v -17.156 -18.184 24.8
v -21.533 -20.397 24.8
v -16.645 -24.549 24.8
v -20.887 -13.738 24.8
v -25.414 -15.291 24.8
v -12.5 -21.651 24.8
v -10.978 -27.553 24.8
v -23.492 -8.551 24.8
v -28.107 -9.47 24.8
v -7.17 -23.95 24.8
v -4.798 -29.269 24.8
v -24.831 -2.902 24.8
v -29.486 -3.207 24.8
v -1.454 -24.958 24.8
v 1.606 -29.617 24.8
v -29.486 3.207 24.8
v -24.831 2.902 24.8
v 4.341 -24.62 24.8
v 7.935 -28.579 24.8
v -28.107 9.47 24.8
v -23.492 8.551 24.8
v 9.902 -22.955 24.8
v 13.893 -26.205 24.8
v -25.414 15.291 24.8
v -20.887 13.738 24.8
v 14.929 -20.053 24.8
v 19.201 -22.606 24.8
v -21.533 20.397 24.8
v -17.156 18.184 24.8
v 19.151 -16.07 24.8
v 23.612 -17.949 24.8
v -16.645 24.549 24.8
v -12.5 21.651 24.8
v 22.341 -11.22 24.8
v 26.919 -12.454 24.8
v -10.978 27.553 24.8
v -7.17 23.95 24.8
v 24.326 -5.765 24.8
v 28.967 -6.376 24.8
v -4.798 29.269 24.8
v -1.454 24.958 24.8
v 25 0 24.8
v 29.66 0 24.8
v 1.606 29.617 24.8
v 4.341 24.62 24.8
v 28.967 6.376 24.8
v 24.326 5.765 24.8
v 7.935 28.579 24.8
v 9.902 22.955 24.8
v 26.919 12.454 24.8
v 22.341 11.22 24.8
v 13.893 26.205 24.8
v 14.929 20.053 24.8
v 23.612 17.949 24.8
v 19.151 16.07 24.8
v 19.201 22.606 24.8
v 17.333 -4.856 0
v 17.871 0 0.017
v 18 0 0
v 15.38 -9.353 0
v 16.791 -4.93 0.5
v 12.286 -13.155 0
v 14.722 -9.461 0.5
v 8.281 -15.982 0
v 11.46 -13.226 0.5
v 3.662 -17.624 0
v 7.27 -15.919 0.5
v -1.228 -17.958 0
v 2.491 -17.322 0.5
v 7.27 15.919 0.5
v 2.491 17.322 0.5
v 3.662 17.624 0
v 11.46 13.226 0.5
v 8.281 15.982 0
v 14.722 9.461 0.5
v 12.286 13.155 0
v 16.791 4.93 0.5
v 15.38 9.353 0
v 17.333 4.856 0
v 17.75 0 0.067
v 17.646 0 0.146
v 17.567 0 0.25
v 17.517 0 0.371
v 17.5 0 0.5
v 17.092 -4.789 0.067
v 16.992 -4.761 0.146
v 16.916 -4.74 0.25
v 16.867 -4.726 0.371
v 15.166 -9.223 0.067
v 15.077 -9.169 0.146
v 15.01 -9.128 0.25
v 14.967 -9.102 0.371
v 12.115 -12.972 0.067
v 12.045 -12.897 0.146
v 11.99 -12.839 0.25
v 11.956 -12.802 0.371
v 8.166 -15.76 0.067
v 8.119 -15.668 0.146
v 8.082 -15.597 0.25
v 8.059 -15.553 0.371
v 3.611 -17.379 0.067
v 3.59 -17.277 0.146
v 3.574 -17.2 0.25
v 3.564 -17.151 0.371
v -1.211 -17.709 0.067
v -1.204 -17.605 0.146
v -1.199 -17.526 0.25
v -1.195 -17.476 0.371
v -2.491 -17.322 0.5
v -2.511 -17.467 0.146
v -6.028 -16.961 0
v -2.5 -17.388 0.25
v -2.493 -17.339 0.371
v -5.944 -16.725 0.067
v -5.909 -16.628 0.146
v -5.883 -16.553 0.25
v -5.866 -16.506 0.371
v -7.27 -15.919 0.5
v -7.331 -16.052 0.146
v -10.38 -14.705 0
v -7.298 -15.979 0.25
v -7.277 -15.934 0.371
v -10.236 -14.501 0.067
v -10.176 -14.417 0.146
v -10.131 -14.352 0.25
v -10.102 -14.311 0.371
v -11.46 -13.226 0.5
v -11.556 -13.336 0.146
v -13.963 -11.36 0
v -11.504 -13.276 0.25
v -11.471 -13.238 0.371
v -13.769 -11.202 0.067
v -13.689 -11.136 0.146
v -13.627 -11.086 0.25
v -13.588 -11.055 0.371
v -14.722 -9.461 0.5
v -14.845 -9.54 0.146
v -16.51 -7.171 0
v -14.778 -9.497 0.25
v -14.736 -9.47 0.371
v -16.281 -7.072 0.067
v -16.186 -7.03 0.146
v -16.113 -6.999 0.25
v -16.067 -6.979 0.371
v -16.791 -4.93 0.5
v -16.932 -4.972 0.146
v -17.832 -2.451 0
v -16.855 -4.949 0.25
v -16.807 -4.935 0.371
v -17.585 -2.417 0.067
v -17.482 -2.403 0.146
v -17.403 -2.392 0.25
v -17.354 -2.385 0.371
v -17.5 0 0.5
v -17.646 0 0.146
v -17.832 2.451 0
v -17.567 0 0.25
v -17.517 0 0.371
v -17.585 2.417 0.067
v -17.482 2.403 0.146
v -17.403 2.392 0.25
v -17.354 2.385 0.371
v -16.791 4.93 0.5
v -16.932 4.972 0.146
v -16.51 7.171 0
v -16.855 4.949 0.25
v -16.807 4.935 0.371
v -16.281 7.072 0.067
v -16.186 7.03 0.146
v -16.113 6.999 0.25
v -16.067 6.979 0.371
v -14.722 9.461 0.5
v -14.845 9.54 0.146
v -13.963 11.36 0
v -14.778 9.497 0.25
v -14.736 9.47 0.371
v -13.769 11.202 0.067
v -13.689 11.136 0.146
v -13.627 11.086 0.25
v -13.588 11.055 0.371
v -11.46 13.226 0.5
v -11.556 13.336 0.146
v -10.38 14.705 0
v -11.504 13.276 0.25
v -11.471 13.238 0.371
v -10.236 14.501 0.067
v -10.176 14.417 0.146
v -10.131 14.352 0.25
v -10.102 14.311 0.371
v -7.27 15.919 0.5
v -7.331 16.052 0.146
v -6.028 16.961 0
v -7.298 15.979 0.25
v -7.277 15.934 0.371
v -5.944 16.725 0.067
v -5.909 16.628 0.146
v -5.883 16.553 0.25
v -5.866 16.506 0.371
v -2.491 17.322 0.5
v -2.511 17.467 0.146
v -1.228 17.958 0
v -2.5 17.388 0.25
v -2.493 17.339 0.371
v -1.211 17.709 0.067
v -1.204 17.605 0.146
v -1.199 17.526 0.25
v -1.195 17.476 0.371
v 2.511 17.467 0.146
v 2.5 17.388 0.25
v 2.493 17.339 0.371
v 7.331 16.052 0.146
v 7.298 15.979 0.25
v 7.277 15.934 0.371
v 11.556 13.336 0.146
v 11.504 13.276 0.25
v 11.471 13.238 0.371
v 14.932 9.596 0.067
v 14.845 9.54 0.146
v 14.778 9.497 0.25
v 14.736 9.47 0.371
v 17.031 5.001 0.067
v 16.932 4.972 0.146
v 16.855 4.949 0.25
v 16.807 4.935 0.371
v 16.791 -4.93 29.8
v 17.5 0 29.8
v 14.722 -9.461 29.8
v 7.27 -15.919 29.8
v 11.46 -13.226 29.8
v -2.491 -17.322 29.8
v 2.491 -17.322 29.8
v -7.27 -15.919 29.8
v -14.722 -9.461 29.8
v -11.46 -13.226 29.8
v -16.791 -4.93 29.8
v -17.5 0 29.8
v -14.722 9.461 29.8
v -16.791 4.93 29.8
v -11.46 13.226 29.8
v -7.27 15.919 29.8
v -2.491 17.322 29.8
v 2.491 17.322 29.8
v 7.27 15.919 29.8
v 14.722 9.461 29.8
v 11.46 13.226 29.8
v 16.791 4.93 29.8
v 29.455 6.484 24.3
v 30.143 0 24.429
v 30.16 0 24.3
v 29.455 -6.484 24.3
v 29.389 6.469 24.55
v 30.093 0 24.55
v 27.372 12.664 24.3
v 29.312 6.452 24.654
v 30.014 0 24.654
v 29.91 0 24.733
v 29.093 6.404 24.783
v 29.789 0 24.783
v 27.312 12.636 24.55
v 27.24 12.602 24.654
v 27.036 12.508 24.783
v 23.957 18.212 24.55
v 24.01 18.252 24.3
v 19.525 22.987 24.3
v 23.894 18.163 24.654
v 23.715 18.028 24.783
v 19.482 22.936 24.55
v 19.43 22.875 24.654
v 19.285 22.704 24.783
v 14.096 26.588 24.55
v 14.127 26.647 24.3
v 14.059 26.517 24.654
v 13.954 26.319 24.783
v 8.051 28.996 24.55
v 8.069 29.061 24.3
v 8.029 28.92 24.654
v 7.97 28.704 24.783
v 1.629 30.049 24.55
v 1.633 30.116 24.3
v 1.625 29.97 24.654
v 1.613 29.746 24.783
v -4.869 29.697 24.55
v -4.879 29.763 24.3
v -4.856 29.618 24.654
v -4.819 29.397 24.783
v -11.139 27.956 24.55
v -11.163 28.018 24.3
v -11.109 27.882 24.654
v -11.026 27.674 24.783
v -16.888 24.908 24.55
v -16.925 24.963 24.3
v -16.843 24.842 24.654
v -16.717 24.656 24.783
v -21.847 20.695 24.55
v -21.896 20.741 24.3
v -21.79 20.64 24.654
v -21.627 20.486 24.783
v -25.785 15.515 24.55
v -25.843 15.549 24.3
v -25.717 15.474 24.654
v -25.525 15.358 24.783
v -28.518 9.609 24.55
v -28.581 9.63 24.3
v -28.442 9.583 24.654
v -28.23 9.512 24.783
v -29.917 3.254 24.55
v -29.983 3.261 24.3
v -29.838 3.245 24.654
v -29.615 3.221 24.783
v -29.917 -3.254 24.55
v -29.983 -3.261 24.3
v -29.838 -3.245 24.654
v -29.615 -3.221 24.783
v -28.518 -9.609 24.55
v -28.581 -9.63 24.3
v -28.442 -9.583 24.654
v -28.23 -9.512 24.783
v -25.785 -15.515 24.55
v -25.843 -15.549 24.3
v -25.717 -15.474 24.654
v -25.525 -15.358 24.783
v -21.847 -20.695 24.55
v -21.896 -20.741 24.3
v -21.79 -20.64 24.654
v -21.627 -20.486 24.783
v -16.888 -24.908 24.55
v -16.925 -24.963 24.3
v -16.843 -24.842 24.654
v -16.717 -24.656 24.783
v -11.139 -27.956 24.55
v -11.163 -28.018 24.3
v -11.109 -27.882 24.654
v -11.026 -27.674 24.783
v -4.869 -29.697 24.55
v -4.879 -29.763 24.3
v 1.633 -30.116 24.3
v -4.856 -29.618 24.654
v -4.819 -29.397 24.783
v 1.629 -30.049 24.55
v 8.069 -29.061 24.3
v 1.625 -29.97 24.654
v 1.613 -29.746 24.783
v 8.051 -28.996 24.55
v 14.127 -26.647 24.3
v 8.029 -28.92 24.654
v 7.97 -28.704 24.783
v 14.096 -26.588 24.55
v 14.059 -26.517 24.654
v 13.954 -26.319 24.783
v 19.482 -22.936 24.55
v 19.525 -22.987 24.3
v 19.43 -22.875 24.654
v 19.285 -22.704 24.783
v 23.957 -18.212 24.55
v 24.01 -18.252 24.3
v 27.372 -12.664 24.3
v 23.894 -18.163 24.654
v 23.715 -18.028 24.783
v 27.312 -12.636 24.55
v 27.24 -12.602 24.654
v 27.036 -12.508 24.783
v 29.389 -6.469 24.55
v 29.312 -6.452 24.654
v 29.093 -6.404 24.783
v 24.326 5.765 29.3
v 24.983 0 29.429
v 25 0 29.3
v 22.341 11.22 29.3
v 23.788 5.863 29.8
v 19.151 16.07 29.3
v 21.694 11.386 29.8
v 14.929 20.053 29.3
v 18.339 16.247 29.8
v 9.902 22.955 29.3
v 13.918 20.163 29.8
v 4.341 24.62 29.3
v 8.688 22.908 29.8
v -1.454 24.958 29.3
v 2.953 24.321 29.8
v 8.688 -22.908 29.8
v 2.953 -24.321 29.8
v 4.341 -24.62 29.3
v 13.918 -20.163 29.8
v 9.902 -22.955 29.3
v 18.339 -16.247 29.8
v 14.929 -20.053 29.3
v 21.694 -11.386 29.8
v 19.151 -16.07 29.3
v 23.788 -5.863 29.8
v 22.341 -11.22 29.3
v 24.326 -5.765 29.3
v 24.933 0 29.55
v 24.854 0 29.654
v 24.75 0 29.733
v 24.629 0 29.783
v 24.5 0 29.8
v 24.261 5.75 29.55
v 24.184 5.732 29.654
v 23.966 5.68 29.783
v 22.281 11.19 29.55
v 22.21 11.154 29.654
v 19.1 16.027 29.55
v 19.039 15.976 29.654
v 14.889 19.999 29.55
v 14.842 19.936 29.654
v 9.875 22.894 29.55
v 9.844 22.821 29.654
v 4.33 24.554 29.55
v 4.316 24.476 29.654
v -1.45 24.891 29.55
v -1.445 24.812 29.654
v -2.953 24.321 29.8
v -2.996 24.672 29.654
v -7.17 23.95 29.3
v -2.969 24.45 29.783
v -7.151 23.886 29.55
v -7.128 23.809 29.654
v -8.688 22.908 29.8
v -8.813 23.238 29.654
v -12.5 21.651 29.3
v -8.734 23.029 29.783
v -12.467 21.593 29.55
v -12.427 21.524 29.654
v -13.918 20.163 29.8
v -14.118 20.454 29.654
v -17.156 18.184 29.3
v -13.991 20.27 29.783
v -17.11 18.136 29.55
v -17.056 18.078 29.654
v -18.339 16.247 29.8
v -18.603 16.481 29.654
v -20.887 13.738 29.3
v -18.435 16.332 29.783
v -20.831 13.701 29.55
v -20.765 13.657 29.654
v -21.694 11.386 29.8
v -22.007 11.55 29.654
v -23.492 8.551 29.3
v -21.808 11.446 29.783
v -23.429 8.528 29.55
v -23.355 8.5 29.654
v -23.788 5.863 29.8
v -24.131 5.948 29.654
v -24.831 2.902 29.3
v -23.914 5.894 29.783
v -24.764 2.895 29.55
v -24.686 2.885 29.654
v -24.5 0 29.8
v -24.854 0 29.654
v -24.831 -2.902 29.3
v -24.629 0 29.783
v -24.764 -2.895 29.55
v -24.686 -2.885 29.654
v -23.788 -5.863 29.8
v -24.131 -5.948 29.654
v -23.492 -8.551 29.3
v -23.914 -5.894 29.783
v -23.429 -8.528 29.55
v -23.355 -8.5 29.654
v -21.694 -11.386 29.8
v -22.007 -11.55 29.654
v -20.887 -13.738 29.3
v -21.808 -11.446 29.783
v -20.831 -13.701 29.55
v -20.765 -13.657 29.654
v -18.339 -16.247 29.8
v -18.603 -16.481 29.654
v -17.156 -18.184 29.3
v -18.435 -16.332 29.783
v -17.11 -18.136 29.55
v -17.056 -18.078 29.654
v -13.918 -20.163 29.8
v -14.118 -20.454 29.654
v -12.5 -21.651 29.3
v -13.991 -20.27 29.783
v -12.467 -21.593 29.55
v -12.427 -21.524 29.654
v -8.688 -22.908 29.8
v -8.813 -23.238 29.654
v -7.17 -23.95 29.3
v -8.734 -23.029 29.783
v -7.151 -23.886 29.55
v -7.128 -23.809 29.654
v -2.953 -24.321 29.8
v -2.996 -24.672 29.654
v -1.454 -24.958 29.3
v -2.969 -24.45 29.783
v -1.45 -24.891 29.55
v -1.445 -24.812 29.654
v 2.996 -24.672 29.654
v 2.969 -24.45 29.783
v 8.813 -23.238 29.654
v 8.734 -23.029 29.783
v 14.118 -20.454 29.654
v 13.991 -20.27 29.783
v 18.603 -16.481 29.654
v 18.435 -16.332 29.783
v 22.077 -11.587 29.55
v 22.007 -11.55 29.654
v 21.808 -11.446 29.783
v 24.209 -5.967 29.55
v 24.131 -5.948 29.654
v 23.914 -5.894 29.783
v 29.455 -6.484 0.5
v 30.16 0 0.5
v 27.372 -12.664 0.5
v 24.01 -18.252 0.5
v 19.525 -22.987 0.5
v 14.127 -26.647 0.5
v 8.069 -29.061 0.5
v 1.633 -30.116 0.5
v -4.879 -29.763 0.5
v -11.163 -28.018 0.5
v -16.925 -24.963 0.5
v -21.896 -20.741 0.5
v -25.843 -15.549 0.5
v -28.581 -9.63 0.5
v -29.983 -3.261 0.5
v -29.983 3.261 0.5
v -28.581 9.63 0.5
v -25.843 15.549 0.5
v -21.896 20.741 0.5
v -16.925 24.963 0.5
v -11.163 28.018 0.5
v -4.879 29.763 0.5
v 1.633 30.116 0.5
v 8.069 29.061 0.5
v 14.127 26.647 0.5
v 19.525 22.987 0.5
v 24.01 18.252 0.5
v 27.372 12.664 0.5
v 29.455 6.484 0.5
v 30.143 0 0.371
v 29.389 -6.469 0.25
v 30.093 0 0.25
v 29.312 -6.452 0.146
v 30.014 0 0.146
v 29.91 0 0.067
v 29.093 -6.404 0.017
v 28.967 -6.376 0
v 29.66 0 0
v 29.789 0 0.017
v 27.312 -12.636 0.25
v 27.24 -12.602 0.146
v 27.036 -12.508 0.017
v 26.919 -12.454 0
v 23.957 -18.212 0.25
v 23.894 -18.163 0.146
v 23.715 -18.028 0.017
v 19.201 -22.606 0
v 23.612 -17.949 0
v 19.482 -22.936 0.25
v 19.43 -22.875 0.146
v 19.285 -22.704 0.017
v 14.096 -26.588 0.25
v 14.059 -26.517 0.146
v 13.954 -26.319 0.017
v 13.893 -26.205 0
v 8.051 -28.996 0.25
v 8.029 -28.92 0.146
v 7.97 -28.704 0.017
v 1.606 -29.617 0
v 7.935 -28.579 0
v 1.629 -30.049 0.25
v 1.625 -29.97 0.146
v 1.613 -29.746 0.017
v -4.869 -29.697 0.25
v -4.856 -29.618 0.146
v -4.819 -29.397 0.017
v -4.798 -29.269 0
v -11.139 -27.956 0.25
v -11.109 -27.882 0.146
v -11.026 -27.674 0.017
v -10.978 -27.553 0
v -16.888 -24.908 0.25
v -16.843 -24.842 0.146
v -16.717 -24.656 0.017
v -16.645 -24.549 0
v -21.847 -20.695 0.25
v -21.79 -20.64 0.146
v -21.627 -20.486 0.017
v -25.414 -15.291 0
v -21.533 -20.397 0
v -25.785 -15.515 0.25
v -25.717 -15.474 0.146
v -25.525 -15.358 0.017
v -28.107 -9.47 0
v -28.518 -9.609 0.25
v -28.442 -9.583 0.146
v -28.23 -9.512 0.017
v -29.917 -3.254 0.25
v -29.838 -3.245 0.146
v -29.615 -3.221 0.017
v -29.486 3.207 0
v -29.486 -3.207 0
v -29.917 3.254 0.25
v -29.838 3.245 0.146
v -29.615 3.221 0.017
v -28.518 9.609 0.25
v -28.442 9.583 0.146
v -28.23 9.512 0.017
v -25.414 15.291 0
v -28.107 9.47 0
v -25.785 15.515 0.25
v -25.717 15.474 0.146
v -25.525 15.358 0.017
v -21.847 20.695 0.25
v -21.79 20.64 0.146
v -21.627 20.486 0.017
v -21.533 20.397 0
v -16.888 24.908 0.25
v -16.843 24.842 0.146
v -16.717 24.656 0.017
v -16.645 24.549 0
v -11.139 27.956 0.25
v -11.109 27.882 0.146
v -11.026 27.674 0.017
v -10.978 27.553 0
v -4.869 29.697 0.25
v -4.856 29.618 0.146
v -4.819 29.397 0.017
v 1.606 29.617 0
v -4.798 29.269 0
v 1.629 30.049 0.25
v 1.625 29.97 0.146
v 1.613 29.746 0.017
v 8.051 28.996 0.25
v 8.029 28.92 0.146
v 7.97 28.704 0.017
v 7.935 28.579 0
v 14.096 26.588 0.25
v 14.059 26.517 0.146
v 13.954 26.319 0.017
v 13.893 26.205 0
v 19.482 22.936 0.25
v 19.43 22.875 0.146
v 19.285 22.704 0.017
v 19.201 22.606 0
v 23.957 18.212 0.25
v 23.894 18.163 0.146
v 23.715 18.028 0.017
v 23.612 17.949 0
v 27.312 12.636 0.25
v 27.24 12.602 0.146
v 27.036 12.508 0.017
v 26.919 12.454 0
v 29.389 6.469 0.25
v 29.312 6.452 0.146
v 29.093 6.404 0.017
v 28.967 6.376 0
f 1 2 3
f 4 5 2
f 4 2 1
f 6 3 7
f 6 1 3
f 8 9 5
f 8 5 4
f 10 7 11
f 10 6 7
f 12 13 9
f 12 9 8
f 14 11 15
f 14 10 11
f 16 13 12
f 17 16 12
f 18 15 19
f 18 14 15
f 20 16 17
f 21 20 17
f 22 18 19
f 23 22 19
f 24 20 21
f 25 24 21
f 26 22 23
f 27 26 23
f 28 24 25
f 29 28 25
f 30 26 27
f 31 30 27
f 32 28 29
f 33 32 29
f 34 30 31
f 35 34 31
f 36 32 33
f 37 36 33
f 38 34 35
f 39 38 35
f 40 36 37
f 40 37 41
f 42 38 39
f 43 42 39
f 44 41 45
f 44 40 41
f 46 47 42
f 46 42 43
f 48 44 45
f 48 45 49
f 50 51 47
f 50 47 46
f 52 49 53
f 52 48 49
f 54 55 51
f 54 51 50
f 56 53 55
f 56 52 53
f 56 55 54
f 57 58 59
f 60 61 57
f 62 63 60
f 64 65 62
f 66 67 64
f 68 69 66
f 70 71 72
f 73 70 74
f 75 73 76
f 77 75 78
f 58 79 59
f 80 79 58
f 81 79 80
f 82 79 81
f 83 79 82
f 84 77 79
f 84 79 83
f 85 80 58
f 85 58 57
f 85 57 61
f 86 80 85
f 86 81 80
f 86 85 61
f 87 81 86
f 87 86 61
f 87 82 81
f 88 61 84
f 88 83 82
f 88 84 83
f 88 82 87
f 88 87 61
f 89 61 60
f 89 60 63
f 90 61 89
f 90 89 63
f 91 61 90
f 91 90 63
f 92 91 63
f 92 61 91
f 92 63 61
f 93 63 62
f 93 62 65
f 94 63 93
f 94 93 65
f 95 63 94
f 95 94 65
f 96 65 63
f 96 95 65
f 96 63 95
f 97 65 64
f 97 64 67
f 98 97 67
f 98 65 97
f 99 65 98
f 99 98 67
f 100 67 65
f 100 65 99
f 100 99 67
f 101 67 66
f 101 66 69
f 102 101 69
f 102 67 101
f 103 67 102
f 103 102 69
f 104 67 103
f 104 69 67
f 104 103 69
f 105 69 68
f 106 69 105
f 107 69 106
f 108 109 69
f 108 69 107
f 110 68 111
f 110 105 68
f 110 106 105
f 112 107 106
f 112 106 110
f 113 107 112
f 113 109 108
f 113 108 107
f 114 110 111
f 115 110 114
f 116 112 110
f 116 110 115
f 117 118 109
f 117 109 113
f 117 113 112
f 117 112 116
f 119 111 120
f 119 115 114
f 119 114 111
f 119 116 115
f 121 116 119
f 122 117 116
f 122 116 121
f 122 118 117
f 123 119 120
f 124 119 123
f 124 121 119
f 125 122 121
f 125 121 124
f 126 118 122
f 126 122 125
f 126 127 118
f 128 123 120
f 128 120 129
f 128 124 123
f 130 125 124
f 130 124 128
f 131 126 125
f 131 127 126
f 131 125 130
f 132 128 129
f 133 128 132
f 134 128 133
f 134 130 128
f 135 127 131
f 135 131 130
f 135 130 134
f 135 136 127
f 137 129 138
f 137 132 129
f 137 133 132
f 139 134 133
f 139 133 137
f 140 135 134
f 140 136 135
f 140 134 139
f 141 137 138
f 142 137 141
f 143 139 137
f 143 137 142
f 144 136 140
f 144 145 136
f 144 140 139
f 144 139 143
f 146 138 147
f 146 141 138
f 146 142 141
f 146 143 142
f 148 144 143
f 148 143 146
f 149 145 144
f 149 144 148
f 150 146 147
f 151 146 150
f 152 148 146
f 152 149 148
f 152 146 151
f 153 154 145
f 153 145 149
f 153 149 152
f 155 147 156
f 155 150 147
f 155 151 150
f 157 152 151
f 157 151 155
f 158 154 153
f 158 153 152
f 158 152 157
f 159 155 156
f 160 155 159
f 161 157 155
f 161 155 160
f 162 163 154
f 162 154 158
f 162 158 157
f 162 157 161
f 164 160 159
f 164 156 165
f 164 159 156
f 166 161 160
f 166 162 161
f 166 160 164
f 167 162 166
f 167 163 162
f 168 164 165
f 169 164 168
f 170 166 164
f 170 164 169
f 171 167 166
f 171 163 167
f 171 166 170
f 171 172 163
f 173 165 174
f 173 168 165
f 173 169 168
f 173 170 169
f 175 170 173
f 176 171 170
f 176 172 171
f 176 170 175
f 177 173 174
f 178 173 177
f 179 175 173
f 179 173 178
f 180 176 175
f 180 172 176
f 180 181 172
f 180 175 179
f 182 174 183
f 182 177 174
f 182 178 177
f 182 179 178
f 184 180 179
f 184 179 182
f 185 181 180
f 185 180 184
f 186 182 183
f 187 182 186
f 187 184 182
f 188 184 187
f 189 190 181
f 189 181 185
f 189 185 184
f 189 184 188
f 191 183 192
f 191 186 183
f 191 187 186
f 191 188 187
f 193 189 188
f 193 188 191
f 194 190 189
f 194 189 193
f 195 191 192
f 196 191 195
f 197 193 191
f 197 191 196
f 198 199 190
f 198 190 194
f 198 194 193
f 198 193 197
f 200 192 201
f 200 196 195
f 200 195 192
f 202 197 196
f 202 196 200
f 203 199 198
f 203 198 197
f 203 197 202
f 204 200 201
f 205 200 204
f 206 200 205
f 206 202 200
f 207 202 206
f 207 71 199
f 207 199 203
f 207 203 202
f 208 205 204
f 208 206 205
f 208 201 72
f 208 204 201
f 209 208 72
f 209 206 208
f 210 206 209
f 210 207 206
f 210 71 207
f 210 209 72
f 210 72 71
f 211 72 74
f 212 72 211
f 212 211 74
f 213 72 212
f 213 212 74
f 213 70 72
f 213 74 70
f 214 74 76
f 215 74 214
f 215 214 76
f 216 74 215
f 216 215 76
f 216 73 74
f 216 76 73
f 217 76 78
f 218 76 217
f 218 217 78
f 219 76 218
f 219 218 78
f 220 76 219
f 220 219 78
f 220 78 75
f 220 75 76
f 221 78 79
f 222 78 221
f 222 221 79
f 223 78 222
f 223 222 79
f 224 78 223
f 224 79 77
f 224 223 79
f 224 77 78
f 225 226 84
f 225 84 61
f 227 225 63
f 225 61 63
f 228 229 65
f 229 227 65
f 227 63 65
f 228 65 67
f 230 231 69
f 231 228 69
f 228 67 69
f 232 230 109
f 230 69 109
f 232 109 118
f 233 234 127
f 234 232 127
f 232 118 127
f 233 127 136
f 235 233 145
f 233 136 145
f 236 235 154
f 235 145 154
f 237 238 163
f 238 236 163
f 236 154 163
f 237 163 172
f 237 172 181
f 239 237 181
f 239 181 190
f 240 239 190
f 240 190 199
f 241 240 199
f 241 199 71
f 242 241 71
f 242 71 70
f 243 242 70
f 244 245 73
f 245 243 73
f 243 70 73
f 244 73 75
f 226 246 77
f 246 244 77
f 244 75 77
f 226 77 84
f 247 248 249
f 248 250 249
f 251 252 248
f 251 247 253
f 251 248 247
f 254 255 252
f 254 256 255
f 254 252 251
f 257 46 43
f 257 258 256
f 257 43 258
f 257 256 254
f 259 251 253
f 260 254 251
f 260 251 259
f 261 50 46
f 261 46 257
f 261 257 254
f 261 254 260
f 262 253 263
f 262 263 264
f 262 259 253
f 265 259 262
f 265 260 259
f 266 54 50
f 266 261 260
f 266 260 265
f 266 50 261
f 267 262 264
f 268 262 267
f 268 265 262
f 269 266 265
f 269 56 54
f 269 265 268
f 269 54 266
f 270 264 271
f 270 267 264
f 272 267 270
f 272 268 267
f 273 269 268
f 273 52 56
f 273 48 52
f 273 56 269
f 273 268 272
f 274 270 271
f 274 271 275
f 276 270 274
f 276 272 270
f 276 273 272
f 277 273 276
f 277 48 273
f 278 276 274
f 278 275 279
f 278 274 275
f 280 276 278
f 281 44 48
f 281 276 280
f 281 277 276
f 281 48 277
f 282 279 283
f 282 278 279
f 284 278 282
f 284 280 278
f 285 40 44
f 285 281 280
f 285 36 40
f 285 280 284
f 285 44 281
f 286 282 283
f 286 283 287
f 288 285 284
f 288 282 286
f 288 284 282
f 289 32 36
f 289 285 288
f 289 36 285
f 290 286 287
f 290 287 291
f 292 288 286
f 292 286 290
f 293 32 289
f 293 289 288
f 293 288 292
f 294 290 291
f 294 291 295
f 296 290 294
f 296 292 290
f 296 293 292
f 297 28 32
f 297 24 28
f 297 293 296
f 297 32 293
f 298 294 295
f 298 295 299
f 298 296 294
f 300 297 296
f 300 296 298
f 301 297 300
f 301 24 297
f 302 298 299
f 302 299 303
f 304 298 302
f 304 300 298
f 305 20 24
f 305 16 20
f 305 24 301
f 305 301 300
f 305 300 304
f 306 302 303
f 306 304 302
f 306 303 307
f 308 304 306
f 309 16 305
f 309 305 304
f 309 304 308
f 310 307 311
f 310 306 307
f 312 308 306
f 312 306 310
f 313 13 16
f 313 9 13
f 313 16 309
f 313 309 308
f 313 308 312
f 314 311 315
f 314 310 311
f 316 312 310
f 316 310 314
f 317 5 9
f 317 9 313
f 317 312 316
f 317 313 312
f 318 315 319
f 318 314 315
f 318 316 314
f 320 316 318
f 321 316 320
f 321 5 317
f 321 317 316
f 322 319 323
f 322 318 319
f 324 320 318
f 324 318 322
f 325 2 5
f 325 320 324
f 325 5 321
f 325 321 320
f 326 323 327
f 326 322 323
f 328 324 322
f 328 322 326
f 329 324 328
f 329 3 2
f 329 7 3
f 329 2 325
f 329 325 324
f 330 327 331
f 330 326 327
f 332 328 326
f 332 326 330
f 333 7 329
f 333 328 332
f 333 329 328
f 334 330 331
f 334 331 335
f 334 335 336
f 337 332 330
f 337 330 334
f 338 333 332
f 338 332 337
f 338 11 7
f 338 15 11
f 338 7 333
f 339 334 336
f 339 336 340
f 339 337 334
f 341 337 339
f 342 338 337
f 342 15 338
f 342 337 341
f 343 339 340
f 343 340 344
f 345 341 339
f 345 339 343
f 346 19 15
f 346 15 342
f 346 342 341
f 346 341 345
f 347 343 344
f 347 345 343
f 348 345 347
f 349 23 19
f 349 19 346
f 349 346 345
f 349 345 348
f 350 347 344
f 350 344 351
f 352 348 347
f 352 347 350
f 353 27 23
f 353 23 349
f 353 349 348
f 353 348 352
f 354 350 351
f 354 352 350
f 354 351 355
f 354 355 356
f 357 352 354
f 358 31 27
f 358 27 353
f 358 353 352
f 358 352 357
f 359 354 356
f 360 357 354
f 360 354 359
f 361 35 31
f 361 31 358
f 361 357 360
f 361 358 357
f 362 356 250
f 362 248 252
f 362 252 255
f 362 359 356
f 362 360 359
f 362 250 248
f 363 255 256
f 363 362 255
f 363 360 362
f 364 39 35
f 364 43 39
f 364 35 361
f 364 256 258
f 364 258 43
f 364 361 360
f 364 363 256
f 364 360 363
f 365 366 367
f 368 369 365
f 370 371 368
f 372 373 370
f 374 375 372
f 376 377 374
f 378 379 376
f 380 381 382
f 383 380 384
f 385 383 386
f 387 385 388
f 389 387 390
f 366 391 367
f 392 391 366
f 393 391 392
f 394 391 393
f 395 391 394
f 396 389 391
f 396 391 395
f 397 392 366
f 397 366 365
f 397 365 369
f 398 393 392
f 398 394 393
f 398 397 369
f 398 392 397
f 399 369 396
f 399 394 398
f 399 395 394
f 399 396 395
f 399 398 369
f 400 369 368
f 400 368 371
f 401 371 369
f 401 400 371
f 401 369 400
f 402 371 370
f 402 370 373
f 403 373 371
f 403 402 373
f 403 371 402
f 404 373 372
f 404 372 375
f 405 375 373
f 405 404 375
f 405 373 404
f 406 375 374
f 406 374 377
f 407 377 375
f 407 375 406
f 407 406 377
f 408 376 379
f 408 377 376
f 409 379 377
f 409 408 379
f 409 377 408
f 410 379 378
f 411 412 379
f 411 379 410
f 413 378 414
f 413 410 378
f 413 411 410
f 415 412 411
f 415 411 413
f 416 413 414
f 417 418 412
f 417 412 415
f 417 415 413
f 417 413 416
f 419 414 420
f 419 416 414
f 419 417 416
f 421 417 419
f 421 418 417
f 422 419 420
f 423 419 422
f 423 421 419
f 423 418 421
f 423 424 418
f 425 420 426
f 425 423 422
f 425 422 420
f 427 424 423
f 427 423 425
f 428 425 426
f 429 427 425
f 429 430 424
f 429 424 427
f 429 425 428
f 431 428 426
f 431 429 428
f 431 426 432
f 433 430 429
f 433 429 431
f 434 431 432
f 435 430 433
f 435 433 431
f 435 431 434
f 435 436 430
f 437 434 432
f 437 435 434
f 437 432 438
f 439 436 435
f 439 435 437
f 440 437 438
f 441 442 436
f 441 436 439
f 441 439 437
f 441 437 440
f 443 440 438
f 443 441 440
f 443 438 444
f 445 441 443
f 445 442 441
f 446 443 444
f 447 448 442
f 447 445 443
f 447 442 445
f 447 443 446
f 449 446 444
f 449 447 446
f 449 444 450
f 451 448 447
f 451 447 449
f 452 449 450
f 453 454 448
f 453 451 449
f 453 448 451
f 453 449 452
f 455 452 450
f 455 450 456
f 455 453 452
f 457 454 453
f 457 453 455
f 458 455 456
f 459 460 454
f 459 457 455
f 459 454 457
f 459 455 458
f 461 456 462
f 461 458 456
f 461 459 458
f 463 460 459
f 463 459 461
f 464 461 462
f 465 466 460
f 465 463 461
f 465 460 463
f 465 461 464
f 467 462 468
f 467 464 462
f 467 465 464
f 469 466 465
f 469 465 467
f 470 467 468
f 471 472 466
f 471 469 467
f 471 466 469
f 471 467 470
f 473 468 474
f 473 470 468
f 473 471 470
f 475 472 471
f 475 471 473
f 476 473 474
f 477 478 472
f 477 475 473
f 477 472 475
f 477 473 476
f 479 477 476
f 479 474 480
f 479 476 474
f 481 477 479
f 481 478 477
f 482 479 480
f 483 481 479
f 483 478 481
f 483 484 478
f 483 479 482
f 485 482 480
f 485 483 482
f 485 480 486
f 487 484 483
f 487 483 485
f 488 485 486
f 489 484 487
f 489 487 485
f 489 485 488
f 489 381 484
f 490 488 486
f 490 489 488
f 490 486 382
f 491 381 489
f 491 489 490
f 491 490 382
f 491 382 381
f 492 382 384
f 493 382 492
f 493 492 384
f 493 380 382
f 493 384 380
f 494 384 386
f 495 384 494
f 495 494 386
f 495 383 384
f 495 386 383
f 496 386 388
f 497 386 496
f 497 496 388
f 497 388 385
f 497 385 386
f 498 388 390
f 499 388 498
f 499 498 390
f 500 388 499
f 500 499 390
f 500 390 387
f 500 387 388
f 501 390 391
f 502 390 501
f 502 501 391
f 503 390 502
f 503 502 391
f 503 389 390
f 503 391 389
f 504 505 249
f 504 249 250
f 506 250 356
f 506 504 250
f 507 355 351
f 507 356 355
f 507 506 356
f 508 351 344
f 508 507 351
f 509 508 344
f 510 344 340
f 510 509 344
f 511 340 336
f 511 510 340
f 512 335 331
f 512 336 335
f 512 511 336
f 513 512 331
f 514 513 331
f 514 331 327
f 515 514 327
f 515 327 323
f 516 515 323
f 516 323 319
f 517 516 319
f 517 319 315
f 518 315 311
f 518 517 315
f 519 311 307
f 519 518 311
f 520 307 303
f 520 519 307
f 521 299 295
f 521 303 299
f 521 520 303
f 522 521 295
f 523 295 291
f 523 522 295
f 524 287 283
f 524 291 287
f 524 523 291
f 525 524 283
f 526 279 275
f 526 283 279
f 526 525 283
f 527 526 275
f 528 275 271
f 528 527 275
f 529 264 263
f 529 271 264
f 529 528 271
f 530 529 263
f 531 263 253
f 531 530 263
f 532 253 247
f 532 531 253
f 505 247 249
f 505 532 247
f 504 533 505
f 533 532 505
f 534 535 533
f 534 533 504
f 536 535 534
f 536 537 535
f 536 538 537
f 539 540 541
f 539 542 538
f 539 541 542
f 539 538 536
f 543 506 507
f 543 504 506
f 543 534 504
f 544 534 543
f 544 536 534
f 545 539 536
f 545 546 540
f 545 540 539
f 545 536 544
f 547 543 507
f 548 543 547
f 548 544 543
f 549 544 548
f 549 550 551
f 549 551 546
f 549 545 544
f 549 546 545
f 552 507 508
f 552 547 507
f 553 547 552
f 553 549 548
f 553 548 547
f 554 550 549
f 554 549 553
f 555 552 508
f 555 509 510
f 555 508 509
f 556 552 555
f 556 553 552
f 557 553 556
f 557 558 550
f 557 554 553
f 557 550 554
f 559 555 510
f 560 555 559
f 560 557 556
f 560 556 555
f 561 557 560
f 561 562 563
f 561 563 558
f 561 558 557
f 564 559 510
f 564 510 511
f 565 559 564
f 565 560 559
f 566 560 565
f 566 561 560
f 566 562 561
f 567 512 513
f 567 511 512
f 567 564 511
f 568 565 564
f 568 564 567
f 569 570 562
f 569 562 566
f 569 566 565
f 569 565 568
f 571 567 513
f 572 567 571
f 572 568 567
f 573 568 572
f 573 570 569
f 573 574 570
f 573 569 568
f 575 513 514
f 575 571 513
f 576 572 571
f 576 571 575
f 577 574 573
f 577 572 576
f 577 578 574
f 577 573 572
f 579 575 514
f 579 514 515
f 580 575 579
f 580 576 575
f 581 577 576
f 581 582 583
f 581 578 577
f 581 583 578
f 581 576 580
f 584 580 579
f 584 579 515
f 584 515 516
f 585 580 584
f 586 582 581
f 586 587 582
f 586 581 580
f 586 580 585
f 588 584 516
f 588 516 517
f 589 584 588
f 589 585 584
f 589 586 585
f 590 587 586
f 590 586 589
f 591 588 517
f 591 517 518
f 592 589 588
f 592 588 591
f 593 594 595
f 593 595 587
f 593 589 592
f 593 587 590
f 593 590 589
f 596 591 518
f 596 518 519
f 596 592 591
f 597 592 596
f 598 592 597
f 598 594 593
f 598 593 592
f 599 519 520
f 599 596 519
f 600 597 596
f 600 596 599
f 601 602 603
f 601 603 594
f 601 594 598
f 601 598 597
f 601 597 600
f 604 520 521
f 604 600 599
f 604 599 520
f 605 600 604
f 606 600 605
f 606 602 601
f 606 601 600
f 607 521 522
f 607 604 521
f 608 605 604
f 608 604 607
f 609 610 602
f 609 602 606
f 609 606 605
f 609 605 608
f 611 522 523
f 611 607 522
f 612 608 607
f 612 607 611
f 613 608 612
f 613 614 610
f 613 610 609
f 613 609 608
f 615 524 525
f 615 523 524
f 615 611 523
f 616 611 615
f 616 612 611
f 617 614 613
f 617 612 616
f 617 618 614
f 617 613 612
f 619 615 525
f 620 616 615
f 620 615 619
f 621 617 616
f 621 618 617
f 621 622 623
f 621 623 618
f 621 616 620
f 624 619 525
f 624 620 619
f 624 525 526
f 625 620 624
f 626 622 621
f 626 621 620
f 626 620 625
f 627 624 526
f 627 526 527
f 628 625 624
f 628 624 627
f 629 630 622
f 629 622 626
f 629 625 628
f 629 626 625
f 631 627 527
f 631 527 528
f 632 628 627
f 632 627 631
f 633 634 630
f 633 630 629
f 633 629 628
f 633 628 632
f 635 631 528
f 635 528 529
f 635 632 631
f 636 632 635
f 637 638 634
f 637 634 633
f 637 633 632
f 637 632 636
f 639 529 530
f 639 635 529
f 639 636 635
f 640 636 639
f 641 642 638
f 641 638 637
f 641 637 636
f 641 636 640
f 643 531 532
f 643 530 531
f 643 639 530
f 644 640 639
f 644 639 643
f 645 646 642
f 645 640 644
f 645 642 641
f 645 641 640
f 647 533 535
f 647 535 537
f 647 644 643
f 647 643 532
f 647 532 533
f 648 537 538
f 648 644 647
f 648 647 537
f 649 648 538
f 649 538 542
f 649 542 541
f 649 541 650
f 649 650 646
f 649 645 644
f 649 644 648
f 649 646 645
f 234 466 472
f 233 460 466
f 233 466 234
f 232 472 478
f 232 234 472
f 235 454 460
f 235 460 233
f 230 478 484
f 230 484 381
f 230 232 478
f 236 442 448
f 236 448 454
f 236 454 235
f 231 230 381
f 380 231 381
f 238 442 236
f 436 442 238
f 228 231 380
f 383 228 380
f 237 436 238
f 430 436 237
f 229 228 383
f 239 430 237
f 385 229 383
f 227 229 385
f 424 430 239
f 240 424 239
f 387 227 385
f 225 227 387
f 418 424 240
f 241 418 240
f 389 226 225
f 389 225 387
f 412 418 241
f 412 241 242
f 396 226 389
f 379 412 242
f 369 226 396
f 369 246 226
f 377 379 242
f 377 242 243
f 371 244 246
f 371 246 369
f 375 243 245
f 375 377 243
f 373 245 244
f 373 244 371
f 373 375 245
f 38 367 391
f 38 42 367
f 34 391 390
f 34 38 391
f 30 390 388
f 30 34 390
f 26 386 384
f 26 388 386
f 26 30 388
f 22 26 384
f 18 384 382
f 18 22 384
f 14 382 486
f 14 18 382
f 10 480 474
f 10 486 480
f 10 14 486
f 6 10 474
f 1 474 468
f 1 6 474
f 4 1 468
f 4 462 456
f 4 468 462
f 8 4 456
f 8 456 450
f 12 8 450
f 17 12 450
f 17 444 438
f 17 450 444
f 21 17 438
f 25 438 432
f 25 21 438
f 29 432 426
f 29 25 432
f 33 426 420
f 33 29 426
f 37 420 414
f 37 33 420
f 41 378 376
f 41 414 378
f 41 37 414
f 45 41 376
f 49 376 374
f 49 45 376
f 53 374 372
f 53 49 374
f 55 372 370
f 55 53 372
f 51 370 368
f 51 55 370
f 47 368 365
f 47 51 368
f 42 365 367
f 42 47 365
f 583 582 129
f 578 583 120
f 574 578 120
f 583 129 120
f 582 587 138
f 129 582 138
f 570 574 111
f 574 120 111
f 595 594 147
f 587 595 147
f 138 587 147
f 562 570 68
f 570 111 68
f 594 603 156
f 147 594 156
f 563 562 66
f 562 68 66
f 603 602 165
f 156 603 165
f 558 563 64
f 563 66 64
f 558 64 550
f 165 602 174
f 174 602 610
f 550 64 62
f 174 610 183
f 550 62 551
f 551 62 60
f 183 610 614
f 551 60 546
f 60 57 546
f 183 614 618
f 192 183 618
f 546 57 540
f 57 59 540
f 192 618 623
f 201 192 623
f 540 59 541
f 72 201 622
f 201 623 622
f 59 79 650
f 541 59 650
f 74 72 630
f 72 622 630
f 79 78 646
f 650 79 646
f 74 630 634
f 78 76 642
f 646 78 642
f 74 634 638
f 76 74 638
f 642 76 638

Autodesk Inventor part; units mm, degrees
ref_plane "YZ Plane" through (0, 0, 0) normal (1, 0, 0) x (0, 1, 0)
ref_plane "XZ Plane" through (0, 0, 0) normal (0, 1, 0) x (-1, 0, 0)
ref_plane "XY Plane" through (0, 0, 0) normal (0, 0, 1) x (1, 0, 0)
sketch "Sketch1" plane through (0, 0, 0) normal (0, 0, 1) x (1, 0, 0)
  circle A0 centre (0, 0) radius 30.16
  circle A1 centre (0, 0) radius 17.5
  dimension "d0" = 60.32
  dimension "d1" = 35
extrude "Extrusion1" add sketch "Sketch1" along normal blind 24.8
sketch "Sketch2" plane through (0, 0, 24.8) normal (0, 0, 1) x (1, 0, 0)
  circle A0 centre (0, 0) radius 25
  dimension "d4" = 50
extrude "Extrusion2" add sketch "Sketch2" along normal blind 5
sketch "Sketch3" plane through (0, 0, 29.8) normal (0, 0, 1) x (1, 0, 0)
  circle A0 centre (0, 0) radius 17.5
  dimension "d7" = 35
extrude "Extrusion3" cut sketch "Sketch3" against normal blind 71.75
fillet "Fillet1" radius 0.5 1 edges at (-30.16, 0, 24.8)
fillet "Fillet2" radius 0.5 3 edges at (-30.16, 0, 0) (-25, 0, 29.8) (-17.5, 0, 0)
properties part number "coração do homem de ferro"
